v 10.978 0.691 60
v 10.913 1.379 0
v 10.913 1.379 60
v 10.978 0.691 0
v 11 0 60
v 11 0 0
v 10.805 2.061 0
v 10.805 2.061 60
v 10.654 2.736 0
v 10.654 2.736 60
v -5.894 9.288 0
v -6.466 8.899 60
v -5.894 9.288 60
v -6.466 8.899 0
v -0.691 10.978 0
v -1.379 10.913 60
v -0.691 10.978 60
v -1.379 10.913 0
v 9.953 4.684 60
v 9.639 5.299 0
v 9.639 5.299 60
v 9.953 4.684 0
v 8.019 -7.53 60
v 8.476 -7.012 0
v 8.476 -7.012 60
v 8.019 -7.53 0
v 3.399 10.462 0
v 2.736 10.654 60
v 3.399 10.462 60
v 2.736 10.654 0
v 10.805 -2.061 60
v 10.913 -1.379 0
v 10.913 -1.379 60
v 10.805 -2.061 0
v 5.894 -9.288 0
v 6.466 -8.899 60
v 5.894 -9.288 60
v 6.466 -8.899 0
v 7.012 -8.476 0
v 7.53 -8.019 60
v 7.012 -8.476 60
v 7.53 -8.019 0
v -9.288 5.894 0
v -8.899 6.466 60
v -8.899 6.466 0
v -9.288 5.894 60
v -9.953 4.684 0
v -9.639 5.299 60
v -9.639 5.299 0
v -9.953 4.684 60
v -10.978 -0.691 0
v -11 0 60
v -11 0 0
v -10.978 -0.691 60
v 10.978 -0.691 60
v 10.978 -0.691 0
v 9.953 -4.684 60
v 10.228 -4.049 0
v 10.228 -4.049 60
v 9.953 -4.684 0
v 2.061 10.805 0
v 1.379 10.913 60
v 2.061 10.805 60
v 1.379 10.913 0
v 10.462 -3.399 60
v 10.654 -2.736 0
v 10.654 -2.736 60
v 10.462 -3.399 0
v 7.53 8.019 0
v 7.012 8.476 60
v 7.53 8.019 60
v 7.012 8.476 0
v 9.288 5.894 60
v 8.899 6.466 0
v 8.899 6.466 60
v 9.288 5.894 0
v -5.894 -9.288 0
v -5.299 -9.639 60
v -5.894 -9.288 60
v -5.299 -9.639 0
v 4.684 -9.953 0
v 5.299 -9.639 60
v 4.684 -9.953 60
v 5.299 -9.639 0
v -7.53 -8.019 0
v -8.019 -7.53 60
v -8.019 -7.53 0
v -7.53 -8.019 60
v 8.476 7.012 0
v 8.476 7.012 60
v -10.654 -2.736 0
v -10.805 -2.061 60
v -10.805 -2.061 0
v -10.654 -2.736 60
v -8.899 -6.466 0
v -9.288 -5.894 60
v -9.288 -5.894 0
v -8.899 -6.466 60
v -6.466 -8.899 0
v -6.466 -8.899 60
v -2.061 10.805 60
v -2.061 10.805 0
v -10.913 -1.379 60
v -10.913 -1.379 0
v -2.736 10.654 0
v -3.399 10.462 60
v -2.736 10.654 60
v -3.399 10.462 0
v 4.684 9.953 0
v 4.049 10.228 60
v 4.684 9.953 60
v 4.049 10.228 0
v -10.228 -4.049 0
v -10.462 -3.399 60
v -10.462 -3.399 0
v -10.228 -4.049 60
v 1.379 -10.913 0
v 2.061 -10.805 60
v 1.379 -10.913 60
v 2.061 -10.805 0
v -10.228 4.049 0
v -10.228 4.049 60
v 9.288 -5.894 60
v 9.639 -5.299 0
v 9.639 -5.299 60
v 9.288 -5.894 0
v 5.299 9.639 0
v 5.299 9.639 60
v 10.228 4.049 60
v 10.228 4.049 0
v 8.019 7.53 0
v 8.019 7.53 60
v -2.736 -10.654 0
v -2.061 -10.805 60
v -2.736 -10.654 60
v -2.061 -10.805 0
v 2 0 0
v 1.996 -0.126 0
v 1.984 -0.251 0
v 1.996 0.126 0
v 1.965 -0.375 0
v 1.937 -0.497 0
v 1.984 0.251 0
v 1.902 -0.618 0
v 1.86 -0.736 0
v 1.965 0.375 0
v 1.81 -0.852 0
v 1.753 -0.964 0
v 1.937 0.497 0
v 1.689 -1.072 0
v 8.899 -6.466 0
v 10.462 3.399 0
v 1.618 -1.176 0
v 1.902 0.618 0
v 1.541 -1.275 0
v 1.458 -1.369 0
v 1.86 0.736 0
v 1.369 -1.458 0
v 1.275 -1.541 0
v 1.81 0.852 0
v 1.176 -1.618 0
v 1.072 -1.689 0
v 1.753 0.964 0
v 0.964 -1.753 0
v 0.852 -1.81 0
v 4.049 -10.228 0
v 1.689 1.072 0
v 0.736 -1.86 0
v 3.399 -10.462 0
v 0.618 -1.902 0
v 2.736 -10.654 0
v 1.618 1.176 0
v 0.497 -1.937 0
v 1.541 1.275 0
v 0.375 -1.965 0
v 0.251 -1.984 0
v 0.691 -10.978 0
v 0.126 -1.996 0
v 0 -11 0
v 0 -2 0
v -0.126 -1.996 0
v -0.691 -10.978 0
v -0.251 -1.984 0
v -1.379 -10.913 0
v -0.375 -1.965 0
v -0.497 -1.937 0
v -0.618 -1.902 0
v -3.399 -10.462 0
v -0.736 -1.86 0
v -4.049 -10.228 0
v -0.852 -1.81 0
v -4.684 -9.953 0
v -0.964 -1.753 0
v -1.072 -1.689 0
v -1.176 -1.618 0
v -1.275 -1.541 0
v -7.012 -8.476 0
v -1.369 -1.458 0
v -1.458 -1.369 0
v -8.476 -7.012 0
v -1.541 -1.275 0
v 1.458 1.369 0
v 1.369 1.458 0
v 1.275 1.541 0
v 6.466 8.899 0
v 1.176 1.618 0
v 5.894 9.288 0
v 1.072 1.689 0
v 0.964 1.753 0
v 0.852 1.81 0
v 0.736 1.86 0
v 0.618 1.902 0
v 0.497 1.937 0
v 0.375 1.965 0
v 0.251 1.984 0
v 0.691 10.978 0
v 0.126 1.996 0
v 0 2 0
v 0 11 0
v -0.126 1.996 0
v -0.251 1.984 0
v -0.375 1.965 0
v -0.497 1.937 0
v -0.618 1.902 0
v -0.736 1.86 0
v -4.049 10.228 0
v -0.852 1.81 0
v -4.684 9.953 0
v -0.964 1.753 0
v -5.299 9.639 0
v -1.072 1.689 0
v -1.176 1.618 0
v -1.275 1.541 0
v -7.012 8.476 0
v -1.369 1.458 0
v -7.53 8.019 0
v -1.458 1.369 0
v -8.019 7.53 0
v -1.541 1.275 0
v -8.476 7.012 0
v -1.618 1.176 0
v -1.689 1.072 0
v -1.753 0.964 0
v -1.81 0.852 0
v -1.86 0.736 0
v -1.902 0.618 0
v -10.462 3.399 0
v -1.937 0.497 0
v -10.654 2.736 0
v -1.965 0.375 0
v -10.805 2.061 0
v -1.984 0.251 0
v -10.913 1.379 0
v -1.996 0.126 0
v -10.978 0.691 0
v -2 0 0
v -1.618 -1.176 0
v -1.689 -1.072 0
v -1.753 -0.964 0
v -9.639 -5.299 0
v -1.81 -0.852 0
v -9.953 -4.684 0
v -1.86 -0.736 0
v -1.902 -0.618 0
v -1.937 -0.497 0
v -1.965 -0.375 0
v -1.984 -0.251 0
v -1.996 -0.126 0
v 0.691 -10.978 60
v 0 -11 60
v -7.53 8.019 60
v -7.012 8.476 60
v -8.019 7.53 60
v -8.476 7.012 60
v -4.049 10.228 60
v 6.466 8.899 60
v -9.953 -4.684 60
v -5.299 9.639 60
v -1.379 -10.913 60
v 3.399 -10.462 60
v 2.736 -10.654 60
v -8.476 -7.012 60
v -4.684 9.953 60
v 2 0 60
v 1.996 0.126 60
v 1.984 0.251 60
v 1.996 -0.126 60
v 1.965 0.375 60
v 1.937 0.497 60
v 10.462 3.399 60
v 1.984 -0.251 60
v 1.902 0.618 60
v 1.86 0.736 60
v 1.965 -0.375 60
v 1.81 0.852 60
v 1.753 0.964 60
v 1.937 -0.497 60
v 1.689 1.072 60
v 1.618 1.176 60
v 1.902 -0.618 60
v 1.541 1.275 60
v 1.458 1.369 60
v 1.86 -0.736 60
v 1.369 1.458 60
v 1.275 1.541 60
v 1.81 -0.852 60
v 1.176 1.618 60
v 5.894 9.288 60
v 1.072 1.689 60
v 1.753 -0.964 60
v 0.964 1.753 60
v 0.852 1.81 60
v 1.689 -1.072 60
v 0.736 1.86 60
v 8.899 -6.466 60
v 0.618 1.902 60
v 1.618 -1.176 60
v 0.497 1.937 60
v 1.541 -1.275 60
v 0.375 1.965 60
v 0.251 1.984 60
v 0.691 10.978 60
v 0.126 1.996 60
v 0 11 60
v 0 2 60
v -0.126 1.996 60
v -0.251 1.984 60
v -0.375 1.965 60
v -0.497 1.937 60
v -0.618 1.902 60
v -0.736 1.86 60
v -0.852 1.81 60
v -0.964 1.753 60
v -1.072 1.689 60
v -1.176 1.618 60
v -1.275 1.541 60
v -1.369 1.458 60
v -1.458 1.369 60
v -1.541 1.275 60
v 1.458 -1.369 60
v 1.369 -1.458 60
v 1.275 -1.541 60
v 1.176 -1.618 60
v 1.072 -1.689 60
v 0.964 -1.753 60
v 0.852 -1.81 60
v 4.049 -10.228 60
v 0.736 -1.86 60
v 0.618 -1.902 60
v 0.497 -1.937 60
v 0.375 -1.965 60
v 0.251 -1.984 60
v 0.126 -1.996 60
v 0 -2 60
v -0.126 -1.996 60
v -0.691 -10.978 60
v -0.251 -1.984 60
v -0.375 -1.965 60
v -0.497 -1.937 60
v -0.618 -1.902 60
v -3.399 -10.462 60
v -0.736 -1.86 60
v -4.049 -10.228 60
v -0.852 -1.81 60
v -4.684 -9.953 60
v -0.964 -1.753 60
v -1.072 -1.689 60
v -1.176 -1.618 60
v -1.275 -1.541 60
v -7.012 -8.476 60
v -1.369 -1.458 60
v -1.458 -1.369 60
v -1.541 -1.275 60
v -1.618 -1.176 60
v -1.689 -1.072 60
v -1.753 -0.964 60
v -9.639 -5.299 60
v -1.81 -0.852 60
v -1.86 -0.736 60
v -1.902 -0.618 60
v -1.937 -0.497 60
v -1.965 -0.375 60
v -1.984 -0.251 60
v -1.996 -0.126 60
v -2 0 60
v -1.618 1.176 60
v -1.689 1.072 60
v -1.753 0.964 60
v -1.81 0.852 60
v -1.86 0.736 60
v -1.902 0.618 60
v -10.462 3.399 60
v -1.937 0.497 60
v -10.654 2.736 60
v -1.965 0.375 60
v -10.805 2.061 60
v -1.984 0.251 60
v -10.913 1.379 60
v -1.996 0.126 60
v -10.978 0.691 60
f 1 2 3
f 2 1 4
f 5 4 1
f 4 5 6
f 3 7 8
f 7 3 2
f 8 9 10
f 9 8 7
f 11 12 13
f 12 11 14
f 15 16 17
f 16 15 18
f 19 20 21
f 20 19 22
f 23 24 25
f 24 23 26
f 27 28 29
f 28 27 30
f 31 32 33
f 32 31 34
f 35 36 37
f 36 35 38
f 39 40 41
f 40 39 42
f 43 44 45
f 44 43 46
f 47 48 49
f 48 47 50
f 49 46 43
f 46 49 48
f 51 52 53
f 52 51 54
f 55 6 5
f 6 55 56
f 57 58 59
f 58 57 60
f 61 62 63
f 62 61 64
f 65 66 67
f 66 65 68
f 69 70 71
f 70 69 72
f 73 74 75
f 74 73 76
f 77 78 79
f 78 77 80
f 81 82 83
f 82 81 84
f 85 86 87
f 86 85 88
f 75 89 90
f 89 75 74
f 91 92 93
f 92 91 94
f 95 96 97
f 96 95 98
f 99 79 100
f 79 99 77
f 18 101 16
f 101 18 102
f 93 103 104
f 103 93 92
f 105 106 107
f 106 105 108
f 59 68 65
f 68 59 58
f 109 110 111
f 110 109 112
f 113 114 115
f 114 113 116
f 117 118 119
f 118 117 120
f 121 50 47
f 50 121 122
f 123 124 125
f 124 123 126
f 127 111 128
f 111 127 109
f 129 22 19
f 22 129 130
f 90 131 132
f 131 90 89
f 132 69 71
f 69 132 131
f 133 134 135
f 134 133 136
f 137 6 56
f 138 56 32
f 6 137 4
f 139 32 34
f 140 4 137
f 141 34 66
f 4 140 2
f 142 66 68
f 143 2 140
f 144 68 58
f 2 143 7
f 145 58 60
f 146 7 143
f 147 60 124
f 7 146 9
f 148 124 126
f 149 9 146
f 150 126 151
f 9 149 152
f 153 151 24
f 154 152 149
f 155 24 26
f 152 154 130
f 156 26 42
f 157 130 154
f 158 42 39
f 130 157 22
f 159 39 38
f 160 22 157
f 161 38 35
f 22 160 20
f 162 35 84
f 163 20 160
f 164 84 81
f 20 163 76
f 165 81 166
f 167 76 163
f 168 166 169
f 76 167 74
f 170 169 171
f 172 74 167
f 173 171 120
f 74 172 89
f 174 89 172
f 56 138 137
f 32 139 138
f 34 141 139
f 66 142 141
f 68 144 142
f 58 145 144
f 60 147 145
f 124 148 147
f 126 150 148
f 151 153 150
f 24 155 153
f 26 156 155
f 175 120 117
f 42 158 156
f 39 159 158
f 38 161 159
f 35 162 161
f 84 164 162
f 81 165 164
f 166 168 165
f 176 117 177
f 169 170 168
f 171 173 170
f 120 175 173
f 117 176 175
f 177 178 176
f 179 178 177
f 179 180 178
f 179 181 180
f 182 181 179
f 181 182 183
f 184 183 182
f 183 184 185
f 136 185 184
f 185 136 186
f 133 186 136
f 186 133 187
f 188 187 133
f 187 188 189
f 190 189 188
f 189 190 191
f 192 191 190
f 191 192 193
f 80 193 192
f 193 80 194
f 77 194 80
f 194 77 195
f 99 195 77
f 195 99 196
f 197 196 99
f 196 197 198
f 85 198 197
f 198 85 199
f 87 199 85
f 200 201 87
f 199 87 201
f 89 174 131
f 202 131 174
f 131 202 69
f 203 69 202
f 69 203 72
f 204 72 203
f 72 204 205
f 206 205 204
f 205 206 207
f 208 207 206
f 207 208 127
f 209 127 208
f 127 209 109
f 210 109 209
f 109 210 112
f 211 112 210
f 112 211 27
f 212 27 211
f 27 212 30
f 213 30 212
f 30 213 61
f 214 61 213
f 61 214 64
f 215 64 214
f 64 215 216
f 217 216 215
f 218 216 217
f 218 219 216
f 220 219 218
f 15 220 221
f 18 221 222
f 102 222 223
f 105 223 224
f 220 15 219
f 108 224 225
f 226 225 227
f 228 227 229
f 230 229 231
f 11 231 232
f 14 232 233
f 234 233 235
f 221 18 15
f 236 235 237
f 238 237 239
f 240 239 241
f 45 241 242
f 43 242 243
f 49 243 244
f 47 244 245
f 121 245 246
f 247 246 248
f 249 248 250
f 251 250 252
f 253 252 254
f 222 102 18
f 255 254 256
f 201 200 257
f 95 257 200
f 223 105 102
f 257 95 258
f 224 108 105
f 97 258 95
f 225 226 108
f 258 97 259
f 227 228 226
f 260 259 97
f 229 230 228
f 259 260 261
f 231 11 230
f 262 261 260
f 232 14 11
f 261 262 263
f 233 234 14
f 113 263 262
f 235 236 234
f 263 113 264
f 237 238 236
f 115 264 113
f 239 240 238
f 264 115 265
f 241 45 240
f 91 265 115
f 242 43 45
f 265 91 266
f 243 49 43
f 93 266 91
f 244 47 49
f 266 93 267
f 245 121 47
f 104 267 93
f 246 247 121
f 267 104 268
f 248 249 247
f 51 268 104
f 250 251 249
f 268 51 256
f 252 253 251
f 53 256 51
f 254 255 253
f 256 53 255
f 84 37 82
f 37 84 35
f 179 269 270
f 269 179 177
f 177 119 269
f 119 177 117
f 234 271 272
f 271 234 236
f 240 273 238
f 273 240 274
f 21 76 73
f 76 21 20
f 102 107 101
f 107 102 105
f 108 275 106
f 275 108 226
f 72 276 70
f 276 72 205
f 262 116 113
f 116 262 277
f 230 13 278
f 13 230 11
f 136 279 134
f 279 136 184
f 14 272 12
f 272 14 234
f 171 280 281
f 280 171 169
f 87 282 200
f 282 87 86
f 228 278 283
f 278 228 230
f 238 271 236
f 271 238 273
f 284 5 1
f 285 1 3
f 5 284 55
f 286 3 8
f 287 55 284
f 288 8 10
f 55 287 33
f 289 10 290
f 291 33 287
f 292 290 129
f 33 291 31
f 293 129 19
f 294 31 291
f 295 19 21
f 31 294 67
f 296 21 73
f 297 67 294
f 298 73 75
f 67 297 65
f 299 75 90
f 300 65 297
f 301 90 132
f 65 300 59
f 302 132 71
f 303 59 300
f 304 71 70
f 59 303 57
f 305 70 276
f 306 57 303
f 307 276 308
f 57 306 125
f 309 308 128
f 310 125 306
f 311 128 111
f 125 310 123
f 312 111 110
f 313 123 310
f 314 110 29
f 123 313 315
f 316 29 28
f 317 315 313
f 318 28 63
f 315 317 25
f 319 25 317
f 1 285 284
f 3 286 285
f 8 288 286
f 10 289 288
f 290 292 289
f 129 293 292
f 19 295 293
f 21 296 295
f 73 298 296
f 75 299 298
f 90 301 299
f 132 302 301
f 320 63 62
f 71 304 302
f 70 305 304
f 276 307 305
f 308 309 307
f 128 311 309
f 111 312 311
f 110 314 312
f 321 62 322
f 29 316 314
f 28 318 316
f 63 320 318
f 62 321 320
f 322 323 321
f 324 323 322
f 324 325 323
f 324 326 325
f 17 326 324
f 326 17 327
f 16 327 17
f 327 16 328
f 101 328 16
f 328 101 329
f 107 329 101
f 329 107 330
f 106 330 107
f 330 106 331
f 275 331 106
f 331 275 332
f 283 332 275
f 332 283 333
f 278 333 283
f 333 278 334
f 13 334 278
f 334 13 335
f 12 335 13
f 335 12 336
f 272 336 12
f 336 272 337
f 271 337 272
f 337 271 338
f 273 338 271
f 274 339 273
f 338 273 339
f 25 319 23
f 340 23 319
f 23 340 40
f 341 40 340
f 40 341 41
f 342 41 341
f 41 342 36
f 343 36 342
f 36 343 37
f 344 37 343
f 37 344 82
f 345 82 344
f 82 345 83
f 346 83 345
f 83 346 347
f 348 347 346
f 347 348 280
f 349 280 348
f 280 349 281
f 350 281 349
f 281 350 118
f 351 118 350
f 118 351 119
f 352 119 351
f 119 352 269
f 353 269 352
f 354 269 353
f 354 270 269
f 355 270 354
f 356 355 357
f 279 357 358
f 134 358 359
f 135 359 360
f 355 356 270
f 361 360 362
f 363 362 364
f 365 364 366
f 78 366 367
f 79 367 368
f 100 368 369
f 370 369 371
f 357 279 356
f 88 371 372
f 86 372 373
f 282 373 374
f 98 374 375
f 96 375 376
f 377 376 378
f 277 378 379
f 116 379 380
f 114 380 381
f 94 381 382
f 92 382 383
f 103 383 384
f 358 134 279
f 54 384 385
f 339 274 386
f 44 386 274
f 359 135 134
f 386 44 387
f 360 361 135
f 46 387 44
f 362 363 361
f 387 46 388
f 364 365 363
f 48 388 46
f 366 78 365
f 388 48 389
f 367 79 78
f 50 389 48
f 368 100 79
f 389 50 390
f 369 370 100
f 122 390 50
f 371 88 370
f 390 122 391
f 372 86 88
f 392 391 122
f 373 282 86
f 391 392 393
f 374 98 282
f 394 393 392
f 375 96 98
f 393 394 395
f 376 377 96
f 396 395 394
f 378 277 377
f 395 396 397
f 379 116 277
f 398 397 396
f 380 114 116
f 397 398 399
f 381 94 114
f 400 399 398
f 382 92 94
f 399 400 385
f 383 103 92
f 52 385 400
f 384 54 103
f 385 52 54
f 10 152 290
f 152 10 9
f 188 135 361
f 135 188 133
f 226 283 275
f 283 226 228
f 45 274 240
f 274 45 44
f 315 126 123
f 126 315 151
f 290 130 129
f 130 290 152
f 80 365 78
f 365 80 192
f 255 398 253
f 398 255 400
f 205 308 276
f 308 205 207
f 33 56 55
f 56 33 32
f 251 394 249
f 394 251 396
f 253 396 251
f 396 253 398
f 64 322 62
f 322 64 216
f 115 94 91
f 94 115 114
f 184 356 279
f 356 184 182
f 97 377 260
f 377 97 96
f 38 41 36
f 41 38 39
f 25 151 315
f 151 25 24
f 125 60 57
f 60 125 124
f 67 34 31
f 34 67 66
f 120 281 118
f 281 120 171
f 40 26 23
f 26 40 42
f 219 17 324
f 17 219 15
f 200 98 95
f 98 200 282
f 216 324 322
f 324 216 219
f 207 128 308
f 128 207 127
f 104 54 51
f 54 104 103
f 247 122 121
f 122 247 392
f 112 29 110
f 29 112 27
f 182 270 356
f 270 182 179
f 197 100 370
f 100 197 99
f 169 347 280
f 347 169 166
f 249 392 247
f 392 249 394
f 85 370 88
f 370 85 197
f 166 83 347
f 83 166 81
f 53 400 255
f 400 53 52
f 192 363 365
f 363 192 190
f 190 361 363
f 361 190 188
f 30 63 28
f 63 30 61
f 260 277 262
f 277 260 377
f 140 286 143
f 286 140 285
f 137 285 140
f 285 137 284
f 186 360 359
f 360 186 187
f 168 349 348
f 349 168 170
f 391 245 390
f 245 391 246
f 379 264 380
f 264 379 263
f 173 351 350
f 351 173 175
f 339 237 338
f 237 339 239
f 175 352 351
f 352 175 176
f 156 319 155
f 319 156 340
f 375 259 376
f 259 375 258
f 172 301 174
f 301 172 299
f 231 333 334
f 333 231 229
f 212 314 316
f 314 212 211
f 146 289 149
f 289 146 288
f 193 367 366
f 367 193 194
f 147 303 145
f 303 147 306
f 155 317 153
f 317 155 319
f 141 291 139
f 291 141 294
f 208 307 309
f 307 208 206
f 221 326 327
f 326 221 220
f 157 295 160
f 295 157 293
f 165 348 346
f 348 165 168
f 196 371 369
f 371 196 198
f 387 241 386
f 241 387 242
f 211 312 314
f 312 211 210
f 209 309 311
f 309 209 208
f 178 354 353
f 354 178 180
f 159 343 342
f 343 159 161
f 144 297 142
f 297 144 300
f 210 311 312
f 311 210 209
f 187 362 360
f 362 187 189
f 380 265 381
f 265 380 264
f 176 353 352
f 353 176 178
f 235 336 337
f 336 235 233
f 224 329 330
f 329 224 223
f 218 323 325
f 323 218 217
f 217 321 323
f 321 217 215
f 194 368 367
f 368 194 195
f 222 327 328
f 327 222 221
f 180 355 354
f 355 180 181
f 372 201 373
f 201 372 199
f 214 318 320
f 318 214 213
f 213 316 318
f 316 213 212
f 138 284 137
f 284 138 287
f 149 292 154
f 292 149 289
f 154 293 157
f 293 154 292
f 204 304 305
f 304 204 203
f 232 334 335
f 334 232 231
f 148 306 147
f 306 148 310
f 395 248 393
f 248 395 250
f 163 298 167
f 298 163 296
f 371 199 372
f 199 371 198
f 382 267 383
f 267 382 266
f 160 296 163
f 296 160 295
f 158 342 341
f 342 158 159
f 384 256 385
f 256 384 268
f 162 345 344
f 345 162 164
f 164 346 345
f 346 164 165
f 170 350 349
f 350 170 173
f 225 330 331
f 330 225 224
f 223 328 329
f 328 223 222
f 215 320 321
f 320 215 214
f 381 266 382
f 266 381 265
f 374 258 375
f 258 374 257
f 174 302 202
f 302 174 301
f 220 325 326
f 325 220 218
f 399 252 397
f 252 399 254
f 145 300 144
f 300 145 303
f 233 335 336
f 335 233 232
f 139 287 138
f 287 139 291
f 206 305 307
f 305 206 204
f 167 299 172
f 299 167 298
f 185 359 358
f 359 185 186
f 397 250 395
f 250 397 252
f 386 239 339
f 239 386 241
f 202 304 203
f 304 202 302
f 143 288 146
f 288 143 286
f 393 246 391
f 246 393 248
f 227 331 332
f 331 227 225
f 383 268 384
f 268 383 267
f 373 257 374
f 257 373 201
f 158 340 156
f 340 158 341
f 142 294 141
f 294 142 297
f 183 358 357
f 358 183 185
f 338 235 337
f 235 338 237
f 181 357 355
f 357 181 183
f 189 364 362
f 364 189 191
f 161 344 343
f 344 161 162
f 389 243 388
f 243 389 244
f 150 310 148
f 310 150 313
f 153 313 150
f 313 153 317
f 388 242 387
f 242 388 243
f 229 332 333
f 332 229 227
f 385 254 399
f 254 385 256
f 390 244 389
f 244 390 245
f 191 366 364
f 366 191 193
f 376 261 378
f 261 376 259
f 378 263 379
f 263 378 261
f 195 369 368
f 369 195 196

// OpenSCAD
outside_diameter = 22;
inside_diameter = 4;
height = 60;
$fn = 100;

difference() {
    cylinder(h=height, d=outside_diameter);
    cylinder(h=height, d=inside_diameter);
}
